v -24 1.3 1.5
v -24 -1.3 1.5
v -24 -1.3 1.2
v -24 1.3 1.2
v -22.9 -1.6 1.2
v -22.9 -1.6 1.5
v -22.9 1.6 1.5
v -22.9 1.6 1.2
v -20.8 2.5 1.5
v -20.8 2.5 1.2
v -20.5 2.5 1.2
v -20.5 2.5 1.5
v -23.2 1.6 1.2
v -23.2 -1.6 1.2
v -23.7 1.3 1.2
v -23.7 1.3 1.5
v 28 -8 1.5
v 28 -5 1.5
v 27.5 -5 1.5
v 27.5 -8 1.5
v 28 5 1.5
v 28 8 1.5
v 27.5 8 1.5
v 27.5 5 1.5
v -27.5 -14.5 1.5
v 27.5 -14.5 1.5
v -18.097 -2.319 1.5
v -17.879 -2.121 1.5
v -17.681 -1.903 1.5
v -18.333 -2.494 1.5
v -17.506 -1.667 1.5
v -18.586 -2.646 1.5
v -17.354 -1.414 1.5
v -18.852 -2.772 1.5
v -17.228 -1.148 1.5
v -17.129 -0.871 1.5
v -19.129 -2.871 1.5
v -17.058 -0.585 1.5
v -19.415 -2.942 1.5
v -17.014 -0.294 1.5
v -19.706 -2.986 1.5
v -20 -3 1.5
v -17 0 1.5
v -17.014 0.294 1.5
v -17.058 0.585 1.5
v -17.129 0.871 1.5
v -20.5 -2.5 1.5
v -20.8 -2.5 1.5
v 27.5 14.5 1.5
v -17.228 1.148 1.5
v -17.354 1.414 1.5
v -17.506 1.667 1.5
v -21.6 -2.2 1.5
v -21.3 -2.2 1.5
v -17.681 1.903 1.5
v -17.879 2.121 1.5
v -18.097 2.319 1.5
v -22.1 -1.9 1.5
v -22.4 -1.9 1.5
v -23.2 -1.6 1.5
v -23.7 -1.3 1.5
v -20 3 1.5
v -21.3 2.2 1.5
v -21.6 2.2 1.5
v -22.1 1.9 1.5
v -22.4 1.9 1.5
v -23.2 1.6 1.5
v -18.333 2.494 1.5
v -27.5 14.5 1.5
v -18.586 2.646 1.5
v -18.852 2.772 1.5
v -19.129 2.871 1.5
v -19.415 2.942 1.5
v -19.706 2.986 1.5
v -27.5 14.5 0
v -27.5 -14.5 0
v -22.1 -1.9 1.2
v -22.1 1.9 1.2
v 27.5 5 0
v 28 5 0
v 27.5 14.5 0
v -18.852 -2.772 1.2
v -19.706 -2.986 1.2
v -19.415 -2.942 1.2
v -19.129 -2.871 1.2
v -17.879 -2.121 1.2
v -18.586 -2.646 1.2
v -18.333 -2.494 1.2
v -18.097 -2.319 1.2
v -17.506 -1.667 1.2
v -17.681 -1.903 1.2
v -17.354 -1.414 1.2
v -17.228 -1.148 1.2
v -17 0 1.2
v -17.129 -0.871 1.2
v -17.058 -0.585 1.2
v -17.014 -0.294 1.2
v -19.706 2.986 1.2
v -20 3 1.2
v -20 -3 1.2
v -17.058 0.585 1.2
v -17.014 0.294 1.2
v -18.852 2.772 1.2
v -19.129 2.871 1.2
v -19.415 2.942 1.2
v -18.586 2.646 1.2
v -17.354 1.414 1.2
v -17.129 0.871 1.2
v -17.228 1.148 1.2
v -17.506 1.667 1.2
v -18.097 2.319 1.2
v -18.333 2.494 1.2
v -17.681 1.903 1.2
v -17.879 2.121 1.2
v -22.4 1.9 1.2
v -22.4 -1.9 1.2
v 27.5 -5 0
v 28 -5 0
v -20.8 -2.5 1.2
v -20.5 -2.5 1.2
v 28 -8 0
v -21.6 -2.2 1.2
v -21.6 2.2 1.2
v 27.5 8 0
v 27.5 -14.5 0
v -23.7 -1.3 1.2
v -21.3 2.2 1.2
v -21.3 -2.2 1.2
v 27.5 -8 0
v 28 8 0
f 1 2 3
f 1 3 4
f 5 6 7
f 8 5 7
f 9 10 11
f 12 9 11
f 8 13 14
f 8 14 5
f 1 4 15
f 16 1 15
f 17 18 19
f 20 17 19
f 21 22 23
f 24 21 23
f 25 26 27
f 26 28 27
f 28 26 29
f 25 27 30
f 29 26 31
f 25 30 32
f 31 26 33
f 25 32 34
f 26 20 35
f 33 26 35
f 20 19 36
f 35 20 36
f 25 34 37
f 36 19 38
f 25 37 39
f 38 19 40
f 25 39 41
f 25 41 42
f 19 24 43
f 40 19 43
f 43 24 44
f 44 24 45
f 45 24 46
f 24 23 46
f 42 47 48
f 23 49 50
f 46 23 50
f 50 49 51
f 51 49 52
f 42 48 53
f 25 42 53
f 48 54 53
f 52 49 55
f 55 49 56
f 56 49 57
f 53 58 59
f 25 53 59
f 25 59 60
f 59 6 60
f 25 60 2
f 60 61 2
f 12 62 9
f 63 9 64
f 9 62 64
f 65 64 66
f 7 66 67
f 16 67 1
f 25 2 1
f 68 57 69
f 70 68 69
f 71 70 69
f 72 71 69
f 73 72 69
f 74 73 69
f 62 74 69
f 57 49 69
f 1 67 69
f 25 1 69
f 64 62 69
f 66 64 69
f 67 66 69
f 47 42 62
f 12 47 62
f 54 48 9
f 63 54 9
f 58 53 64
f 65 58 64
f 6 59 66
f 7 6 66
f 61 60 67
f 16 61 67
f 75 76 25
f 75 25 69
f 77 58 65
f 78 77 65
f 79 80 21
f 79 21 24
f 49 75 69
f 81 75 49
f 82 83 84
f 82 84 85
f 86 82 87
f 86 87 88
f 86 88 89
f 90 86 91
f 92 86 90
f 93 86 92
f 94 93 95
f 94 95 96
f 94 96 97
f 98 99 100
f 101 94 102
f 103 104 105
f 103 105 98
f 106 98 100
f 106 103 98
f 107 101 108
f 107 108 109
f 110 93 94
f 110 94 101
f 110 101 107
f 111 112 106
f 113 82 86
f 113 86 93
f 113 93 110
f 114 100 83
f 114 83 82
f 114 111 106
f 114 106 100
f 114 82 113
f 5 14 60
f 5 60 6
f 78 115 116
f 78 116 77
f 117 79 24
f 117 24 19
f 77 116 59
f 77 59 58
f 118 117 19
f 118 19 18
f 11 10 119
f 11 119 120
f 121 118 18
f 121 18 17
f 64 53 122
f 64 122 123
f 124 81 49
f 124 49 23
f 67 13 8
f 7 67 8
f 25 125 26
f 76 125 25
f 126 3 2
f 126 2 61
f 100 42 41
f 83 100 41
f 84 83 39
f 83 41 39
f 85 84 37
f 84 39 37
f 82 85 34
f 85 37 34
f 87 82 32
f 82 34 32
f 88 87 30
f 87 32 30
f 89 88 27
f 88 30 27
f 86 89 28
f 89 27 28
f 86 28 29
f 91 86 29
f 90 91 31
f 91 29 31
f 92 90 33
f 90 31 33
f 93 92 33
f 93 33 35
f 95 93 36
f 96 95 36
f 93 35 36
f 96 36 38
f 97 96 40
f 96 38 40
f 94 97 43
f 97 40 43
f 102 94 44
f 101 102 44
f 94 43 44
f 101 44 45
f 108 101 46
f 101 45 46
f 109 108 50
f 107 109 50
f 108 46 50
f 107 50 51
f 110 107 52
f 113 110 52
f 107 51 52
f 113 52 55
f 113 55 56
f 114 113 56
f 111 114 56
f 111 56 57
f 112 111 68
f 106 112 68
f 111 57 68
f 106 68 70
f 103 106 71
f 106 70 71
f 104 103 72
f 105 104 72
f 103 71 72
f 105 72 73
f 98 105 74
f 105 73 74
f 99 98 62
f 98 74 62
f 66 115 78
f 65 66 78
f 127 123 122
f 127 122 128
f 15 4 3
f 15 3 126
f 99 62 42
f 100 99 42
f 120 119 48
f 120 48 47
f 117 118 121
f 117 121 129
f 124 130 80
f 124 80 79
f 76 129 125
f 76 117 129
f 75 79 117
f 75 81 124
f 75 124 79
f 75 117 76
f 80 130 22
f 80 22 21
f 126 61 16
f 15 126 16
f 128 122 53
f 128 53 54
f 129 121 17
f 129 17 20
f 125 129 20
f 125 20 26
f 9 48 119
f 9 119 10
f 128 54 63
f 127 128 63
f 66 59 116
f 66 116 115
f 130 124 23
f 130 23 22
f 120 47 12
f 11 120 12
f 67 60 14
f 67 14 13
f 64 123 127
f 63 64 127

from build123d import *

# Parameters (mm, degrees)
EXTRUDE_1_DEPTH     = 1.5
SKETCH_2_W          = 0.3
SKETCH_2_H          = 5
SKETCH_2_H_2        = 4.4
SKETCH_2_H_3        = 3.8
SKETCH_2_H_4        = 3.2
SKETCH_2_H_5        = 2.6
CUT_EXTRUDE_1_DEPTH = 0.3


with BuildPart() as part:
    # 草图1 → 凸台-拉伸1 (new body)
    with BuildSketch(Plane.XY):
        Polygon((27.5, 8), (28, 8), (28, 5), (27.5, 5), (27.5, -5), (28, -5), (28, -8), (27.5, -8), (27.5, -14.5), (-27.5, -14.5), (-27.5, 14.5), (27.5, 14.5), align=None)
    extrude(amount=EXTRUDE_1_DEPTH)

    # 草图2 → 切除-拉伸1 (cut)
    with BuildSketch(Plane.XY.offset(1.5)):
        with BuildLine():
            Line((-20, 3), (-20, -3))
            ThreePointArc((-20, -3), (-17, 0), (-20, 3))
        make_face()
        with Locations((-20.65, 0)):
            Rectangle(SKETCH_2_W, SKETCH_2_H)
        with Locations((-21.45, 0)):
            Rectangle(SKETCH_2_W, SKETCH_2_H_2)
        with Locations((-22.25, 0)):
            Rectangle(SKETCH_2_W, SKETCH_2_H_3)
        with Locations((-23.05, 0)):
            Rectangle(SKETCH_2_W, SKETCH_2_H_4)
        with Locations((-23.85, 0)):
            Rectangle(SKETCH_2_W, SKETCH_2_H_5)
    extrude(amount=-CUT_EXTRUDE_1_DEPTH, mode=Mode.SUBTRACT)


solid = part.part
